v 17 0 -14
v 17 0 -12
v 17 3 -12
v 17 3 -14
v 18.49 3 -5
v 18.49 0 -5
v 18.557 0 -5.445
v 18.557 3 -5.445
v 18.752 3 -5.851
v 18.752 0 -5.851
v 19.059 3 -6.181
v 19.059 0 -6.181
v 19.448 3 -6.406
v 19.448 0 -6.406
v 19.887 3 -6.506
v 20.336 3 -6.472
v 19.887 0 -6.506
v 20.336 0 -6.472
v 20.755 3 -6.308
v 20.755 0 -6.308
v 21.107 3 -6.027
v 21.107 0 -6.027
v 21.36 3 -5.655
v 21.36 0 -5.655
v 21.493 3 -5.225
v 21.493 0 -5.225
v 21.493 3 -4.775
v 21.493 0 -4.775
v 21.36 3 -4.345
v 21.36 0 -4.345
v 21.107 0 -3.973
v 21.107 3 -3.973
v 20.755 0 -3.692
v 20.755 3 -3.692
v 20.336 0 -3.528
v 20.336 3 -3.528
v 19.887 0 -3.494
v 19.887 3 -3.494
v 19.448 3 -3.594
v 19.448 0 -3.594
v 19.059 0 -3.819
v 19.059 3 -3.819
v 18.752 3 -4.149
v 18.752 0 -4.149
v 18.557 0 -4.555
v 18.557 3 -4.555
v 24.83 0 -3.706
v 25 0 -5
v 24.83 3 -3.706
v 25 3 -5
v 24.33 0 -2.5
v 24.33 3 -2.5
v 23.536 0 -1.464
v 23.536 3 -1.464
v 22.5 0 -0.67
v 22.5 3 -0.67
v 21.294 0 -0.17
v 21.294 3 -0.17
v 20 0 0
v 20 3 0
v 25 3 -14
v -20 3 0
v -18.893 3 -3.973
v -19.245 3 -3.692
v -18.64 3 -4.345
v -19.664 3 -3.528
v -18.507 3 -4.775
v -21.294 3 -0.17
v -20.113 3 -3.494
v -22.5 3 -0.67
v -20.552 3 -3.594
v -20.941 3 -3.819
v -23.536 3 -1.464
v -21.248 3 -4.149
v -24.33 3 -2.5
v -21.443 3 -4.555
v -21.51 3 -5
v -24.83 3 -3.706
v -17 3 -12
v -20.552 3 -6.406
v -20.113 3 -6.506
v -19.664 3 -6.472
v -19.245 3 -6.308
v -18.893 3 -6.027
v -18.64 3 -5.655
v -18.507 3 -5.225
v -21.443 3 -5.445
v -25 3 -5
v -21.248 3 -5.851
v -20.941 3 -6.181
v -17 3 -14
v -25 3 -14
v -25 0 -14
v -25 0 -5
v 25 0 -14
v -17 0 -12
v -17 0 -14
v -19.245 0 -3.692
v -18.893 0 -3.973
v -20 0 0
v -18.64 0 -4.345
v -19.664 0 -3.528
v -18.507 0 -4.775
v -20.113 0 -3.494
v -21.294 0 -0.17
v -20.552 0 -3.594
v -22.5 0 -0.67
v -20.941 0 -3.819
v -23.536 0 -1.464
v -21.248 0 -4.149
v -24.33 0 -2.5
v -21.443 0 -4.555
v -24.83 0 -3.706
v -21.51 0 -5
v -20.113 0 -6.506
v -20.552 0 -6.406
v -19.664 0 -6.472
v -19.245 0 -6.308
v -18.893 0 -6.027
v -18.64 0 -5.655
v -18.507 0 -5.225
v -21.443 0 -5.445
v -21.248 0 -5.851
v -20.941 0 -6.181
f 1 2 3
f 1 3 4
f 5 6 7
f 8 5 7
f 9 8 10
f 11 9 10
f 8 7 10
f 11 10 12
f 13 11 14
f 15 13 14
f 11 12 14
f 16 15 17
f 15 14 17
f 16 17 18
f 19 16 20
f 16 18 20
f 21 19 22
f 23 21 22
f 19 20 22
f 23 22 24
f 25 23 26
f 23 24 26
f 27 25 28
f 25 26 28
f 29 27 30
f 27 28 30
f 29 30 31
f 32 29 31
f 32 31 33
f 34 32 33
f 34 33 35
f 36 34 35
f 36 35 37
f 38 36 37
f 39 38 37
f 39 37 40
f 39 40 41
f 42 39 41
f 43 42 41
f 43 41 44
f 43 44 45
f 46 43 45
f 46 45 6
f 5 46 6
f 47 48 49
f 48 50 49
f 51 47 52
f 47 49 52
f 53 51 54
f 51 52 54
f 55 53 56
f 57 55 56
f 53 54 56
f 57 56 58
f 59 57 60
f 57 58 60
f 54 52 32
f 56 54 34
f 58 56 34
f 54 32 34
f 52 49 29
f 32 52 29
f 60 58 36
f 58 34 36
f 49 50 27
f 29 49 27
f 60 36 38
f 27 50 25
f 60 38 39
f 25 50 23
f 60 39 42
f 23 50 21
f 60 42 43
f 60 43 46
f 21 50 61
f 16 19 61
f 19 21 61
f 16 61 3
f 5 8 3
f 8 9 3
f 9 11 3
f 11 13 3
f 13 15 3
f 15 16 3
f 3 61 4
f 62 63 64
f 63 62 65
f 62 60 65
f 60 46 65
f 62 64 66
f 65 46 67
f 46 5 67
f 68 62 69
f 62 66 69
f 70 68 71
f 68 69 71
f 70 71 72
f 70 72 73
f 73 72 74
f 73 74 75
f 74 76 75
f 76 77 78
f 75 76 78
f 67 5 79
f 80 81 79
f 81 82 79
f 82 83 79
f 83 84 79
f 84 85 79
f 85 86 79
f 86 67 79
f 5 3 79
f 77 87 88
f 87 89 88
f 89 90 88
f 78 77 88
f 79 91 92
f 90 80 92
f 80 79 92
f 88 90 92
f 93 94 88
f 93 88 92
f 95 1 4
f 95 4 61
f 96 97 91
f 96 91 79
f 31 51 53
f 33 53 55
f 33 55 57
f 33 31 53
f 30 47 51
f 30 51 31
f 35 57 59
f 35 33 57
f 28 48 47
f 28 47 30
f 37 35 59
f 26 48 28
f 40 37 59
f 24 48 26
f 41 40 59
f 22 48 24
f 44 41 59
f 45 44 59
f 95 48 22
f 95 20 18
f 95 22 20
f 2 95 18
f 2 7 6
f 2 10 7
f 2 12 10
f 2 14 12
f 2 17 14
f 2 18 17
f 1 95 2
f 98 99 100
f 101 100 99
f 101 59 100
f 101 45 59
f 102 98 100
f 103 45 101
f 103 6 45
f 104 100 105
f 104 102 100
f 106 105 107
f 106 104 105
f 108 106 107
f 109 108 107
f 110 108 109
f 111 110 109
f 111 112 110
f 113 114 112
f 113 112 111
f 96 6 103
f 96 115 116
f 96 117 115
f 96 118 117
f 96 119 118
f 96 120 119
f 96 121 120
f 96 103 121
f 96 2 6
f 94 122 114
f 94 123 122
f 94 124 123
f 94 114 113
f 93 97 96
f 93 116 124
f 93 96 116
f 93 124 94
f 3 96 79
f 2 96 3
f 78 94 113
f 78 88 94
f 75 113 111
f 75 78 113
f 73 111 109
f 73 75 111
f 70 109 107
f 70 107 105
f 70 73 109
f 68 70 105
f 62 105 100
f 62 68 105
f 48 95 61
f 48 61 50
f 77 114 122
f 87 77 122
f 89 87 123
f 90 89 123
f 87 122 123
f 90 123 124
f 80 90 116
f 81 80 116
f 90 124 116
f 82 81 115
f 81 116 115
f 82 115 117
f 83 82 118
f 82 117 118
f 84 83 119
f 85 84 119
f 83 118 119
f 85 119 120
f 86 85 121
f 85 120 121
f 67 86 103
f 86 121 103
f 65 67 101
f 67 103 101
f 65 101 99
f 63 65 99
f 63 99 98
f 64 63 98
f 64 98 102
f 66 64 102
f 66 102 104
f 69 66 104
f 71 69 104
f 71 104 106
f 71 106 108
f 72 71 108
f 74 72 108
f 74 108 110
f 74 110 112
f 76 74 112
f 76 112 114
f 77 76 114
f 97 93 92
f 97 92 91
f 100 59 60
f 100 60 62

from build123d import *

# Parameters (mm, degrees)
BOSS_EXTRUDE1_DEPTH  = 3
M3_CLEARANCE_HOLE1_D = 3.02
FILLET1_R            = 5


with BuildPart() as part:
    # Sketch1 → Boss-Extrude1 (new body)
    with BuildSketch(Plane(origin=(0, 0, 0), x_dir=(1, 0, 0), z_dir=(0, 1, 0))):
        Polygon((-17, 12), (17, 12), (17, 14), (25, 14), (25, 0), (-25, 0), (-25, 14), (-17, 14), align=None)
    extrude(amount=BOSS_EXTRUDE1_DEPTH)

    # M3 Clearance Hole1 (through all)
    with Locations(Plane(origin=(0, 3, 0), x_dir=(1, 0, 0), z_dir=(0, 1, 0))):
        with Locations((20, 5), (-20, 5)):
            Hole(M3_CLEARANCE_HOLE1_D / 2)

    # Fillet1
    fillet1_edges = [part.edges().sort_by_distance(p)[0] for p in [
        (25, 1.5, 0),
        (-25, 1.5, 0),
    ]]
    fillet(fillet1_edges, radius=FILLET1_R)


solid = part.part
